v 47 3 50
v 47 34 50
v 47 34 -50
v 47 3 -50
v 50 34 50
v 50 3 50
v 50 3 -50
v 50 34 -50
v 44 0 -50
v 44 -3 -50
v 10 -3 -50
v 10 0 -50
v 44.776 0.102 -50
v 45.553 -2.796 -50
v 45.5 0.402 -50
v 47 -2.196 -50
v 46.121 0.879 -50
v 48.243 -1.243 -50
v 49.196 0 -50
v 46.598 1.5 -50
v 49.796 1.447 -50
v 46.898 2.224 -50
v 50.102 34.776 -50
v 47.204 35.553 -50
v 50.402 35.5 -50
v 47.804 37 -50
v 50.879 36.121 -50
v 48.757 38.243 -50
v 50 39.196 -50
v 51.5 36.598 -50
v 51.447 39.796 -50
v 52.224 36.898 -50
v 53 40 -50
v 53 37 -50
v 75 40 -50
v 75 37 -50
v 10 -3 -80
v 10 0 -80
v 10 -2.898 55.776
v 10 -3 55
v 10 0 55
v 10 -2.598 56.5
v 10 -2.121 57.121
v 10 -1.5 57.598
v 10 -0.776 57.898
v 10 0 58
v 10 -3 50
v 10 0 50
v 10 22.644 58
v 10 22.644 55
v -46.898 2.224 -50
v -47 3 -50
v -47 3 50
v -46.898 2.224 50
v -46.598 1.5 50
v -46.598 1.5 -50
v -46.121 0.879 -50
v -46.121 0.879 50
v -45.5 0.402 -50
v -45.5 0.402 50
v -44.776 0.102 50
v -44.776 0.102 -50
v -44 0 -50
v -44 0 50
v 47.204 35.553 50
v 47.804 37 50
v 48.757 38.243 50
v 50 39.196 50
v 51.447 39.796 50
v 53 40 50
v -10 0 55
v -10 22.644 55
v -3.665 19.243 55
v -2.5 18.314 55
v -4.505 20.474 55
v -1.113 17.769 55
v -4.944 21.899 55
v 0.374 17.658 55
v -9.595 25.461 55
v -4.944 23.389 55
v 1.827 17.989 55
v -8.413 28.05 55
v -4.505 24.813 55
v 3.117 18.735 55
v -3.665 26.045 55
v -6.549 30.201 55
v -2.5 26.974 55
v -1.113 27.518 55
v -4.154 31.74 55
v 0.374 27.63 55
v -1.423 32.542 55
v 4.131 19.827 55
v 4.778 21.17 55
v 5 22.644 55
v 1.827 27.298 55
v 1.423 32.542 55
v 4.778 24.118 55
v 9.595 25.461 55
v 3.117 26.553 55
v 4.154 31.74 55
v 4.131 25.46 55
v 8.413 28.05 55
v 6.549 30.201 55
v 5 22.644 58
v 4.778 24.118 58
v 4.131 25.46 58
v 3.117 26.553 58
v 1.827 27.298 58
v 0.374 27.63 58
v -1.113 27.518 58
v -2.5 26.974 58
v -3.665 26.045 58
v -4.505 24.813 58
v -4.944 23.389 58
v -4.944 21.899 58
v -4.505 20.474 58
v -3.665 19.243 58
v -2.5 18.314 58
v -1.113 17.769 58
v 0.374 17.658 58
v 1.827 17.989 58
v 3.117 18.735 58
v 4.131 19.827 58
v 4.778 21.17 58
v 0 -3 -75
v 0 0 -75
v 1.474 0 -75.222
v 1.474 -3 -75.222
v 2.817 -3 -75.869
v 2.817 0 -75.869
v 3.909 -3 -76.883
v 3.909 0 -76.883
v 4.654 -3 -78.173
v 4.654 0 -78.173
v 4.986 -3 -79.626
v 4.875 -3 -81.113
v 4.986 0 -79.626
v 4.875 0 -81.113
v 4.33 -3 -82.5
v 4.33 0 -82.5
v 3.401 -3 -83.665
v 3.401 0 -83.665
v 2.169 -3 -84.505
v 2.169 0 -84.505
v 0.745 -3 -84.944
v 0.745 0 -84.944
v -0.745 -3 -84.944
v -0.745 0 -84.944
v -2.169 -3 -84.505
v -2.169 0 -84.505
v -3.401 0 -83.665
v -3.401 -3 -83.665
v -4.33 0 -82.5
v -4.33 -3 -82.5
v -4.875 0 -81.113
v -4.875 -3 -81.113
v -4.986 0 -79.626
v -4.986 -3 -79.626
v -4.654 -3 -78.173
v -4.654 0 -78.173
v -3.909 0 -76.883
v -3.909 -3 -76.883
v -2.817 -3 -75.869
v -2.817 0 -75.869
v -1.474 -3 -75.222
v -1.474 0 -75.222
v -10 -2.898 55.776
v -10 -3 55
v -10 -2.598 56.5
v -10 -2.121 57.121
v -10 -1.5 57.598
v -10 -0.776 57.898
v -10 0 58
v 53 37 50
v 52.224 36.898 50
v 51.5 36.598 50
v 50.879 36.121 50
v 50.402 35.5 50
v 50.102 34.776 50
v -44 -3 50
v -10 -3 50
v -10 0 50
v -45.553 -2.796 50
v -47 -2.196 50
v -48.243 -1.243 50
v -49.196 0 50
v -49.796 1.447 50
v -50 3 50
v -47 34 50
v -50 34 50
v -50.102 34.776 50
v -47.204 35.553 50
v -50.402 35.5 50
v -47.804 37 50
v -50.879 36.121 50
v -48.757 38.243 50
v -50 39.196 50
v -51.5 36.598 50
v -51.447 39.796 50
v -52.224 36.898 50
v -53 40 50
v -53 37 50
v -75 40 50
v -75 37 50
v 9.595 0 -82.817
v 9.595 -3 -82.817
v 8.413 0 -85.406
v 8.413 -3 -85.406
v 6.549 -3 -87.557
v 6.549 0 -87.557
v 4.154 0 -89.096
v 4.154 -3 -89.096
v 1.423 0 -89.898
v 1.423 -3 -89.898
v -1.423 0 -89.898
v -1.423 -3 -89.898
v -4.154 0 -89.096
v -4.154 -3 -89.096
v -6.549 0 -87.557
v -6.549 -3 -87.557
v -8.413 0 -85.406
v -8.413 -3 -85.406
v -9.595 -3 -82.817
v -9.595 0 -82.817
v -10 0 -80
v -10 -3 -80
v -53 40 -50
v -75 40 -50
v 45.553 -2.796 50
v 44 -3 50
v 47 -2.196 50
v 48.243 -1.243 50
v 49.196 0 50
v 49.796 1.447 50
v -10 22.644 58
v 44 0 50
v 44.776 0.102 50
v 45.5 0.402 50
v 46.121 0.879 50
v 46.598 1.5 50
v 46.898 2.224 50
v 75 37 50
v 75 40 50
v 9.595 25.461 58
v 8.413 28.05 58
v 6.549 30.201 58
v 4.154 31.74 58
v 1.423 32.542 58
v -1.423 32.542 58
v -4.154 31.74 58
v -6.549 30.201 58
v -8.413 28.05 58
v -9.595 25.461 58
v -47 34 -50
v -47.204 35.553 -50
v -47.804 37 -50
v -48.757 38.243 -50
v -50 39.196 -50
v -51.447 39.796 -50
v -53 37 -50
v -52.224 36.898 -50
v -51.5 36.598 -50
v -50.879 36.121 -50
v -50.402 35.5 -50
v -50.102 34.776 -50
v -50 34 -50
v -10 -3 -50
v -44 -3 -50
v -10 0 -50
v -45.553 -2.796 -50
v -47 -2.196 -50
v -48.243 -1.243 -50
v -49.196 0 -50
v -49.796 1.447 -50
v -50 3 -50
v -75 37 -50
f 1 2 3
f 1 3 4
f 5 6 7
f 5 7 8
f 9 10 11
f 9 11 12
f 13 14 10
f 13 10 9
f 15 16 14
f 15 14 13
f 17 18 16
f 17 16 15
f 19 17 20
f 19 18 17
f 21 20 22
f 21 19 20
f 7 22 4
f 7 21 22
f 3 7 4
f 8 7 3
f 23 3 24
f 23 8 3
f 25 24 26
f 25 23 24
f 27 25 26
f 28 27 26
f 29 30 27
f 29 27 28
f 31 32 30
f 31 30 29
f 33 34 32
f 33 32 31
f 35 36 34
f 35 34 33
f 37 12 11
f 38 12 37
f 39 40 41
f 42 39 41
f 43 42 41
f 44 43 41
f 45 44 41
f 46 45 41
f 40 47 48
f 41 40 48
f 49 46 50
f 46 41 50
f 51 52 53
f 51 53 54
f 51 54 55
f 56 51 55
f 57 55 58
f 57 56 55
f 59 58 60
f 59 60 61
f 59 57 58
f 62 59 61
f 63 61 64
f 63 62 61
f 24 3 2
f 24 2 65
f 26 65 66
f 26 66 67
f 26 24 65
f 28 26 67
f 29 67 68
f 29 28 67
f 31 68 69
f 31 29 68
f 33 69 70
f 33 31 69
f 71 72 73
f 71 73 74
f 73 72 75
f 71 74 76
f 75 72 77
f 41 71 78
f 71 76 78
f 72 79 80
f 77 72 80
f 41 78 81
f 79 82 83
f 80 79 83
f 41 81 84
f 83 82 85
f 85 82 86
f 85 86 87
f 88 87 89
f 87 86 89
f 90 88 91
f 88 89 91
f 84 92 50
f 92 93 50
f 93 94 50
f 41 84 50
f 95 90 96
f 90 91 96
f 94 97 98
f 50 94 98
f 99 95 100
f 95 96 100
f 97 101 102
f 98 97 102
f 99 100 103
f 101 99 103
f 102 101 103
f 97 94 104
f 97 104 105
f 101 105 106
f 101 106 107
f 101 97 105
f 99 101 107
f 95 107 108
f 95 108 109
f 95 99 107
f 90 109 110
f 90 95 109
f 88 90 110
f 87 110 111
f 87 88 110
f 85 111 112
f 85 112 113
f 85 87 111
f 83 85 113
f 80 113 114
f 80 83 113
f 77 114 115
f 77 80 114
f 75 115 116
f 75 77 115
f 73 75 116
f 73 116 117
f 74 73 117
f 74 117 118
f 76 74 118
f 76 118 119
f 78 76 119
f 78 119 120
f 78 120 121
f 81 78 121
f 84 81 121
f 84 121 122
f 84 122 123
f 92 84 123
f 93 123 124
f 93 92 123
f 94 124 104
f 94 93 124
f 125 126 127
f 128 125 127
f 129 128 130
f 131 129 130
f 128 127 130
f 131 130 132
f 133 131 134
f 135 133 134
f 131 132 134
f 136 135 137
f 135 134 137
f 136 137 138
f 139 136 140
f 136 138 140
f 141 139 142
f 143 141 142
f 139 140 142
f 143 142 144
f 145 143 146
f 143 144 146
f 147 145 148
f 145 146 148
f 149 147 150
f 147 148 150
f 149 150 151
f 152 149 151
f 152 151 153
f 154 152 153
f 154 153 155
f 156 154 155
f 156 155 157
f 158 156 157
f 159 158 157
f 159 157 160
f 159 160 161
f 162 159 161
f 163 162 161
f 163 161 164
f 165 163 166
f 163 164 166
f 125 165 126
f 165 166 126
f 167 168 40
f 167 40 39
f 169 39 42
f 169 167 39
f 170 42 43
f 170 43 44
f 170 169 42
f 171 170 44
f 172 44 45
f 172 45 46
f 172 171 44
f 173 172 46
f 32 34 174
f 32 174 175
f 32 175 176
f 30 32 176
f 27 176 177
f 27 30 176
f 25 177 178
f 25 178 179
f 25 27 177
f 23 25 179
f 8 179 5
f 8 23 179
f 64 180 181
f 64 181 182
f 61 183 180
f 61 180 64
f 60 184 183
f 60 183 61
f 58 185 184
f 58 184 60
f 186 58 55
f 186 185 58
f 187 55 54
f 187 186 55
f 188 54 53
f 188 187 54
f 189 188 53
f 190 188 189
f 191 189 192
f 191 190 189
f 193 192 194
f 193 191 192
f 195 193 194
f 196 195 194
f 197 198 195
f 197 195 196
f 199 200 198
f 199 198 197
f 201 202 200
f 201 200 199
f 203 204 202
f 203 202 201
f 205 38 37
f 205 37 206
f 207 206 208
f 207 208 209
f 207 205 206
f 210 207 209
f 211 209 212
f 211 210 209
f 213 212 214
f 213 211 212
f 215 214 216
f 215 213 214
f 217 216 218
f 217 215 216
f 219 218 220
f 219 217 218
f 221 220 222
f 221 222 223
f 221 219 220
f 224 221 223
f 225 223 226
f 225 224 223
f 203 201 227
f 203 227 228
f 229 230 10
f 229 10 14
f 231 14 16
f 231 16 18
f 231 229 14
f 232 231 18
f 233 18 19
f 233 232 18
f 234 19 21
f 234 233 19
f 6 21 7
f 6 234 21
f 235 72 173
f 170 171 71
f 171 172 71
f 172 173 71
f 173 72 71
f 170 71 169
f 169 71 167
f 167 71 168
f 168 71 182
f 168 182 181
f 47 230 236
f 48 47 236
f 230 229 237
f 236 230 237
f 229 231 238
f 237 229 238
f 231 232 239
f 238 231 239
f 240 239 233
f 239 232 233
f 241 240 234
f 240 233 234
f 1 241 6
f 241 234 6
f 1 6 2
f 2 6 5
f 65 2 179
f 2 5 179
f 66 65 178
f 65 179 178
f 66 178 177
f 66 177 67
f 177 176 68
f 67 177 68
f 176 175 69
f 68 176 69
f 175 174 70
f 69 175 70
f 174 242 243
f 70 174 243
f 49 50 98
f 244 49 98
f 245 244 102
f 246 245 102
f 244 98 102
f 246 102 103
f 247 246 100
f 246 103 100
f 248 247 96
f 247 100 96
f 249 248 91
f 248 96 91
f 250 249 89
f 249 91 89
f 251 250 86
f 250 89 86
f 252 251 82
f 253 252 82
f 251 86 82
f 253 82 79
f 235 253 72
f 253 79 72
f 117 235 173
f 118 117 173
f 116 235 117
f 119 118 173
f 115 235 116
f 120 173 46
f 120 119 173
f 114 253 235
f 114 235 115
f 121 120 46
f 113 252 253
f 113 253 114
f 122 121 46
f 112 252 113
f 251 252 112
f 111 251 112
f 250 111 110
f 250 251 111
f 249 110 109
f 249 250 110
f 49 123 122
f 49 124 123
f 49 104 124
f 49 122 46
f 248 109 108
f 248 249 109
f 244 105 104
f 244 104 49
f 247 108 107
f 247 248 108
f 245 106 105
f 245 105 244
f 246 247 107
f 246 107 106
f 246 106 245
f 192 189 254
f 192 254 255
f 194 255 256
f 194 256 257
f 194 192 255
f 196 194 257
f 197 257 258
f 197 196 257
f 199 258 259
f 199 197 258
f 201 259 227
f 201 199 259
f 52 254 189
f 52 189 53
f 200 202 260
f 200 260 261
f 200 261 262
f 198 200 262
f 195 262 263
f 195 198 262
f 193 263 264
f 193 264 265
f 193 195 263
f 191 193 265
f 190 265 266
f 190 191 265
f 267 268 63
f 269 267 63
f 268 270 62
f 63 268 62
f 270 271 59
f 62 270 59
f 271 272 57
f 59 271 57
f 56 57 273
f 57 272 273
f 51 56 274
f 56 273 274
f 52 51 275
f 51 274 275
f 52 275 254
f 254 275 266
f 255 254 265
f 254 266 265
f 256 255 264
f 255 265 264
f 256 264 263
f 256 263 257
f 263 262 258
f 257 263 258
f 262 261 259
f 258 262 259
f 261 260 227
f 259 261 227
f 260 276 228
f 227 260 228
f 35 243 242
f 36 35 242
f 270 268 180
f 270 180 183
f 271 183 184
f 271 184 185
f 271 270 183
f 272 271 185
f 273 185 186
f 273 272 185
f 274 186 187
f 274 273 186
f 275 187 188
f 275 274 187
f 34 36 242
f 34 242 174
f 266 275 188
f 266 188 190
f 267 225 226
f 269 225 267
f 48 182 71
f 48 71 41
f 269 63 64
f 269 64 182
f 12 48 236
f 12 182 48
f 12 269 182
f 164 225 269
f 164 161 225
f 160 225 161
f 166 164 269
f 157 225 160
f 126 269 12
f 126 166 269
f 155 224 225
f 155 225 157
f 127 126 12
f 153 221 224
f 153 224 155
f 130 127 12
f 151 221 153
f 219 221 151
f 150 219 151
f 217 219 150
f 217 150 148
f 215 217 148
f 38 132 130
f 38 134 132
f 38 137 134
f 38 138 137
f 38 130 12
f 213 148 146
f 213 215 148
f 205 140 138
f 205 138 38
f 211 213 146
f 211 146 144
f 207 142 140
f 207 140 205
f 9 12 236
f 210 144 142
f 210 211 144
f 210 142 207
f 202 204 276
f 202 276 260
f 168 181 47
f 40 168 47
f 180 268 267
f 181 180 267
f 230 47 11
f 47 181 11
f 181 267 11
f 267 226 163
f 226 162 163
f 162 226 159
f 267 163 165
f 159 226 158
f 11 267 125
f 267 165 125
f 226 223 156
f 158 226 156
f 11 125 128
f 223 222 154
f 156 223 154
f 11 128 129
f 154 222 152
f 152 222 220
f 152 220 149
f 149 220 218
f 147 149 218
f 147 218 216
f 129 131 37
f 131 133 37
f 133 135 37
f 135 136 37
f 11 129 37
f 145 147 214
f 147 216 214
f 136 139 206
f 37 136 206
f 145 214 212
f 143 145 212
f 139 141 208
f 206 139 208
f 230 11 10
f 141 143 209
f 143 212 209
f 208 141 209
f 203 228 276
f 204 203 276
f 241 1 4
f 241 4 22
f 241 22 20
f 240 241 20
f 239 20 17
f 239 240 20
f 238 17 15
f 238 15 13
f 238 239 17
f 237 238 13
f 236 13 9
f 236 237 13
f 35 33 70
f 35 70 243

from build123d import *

# Parameters (mm, degrees)
SKETCH1_R                      = 5
BASE_FLANGE1_DEPTH             = 3
EDGE_FLANGE1_STRIP_W           = 18
EDGE_FLANGE1_STRIP_H           = 3
EDGE_FLANGE1_STRIP_CUT_DEPTH   = 100
EDGE_FLANGE1_STRIP_2_W         = 18
EDGE_FLANGE1_STRIP_2_H         = 3
EDGE_FLANGE1_STRIP_CUT_2_DEPTH = 100
EDGE_FLANGE1_DEPTH             = 100
EDGE_FLANGE1_BEND_DEPTH        = 100
EDGE_FLANGE2_STRIP_W           = 18
EDGE_FLANGE2_STRIP_H           = 3
EDGE_FLANGE2_STRIP_CUT_DEPTH   = 100
EDGE_FLANGE2_STRIP_2_W         = 18
EDGE_FLANGE2_STRIP_2_H         = 3
EDGE_FLANGE2_STRIP_CUT_2_DEPTH = 100
EDGE_FLANGE2_DEPTH             = 100
EDGE_FLANGE2_BEND_DEPTH        = 100
SKETCHED_START                 = 58
SKETCHED_BEND1_OUTLINE_W       = 20
SKETCHED_BEND1_OUTLINE_H       = 3
SKETCHED_BEND1_DEPTH           = 33
SKETCHED_START_2               = 55
SKETCHED_BEND1_2_OUTLINE_R     = 5
SKETCHED_BEND1_2_DEPTH         = 3
SKETCHED_START_3               = -11
SKETCHED_BEND1_3_DEPTH         = 22


with BuildPart() as part:
    # Base-Flange1: sheet metal written as solids
    # Sketch1 → Base-Flange1 (new body)
    with BuildSketch(Plane(origin=(0, 0, 0), x_dir=(1, 0, 0), z_dir=(0, 1, 0))):
        with BuildLine():
            Line((10, 50), (10, 80))
            ThreePointArc((10, 80), (0, 90), (-10, 80))
            Line((-10, 80), (-10, 50))
            Line((-10, 50), (-50, 50))
            Line((-50, 50), (-50, -50))
            Line((-50, -50), (-10, -50))
            Line((-10, -50), (-10, -80))
            ThreePointArc((-10, -80), (0, -90), (10, -80))
            Line((10, -80), (10, -50))
            Line((10, -50), (50, -50))
            Line((50, -50), (50, 50))
            Line((50, 50), (10, 50))
        make_face()
        with Locations(Location((0, 80, 0), (0, 0, 270))):
            Circle(SKETCH1_R, mode=Mode.SUBTRACT)
        with Locations(Location((0, -80, 0), (0, 0, 90))):
            Circle(SKETCH1_R, mode=Mode.SUBTRACT)
    extrude(amount=-BASE_FLANGE1_DEPTH)

    # Edge-Flange1: sheet metal written as solids
    # Edge-Flange1 strip (on a plane across the edge) → Edge-Flange1 strip cut (cut)
    with BuildSketch(Plane(origin=(50, 0, 50), x_dir=(-1, 0, 0), z_dir=(0, 0, -1))):
        with Locations((-3, -1.5)):
            Rectangle(EDGE_FLANGE1_STRIP_W, EDGE_FLANGE1_STRIP_H)
    extrude(amount=EDGE_FLANGE1_STRIP_CUT_DEPTH, mode=Mode.SUBTRACT)

    # Edge-Flange1 strip 2 (on a plane across the edge) → Edge-Flange1 strip cut 2 (cut)
    with BuildSketch(Plane(origin=(-50, 0, -50), x_dir=(1, 0, 0), z_dir=(0, 0, 1))):
        with Locations((-3, -1.5)):
            Rectangle(EDGE_FLANGE1_STRIP_2_W, EDGE_FLANGE1_STRIP_2_H)
    extrude(amount=EDGE_FLANGE1_STRIP_CUT_2_DEPTH, mode=Mode.SUBTRACT)

    # Edge-Flange1 section (on a plane across the edge) → Edge-Flange1 (add)
    with BuildSketch(Plane(origin=(50, 0, 50), x_dir=(-1, 0, 0), z_dir=(0, 0, -1))):
        with BuildLine():
            Line((0, 3), (0, 37))
            Line((0, 37), (3, 37))
            Line((3, 37), (3, 3))
            ThreePointArc((3, 3), (3.878679656, 0.878679656), (6, 0))
            Line((6, 0), (6, -3))
            ThreePointArc((6, -3), (1.757359313, -1.242640687), (0, 3))
        make_face()
    extrude(amount=EDGE_FLANGE1_DEPTH)

    # Edge-Flange1 section 2 (on a plane across the edge) → Edge-Flange1 bend (add)
    with BuildSketch(Plane(origin=(-50, 0, -50), x_dir=(1, 0, 0), z_dir=(0, 0, 1))):
        with BuildLine():
            Line((0, 3), (0, 37))
            Line((0, 37), (3, 37))
            Line((3, 37), (3, 3))
            ThreePointArc((3, 3), (3.878679656, 0.878679656), (6, 0))
            Line((6, 0), (6, -3))
            ThreePointArc((6, -3), (1.757359313, -1.242640687), (0, 3))
        make_face()
    extrude(amount=EDGE_FLANGE1_BEND_DEPTH)

    # Edge-Flange2: sheet metal written as solids
    # Edge-Flange2 strip (on a plane across the edge) → Edge-Flange2 strip cut (cut)
    with BuildSketch(Plane(origin=(-50, 37, 50), x_dir=(0, -1, 0), z_dir=(0, 0, -1))):
        with Locations((-6, -1.5)):
            Rectangle(EDGE_FLANGE2_STRIP_W, EDGE_FLANGE2_STRIP_H)
    extrude(amount=EDGE_FLANGE2_STRIP_CUT_DEPTH, mode=Mode.SUBTRACT)

    # Edge-Flange2 strip 2 (on a plane across the edge) → Edge-Flange2 strip cut 2 (cut)
    with BuildSketch(Plane(origin=(50, 37, -50), x_dir=(0, -1, 0), z_dir=(0, 0, 1))):
        with Locations((-6, -1.5)):
            Rectangle(EDGE_FLANGE2_STRIP_2_W, EDGE_FLANGE2_STRIP_2_H)
    extrude(amount=EDGE_FLANGE2_STRIP_CUT_2_DEPTH, mode=Mode.SUBTRACT)

    # Edge-Flange2 section (on a plane across the edge) → Edge-Flange2 (add)
    with BuildSketch(Plane(origin=(-50, 37, 50), x_dir=(0, -1, 0), z_dir=(0, 0, -1))):
        with BuildLine():
            Line((-3, 3), (-3, 25))
            Line((-3, 25), (0, 25))
            Line((0, 25), (0, 3))
            ThreePointArc((0, 3), (0.878679656, 0.878679656), (3, 0))
            Line((3, 0), (3, -3))
            ThreePointArc((3, -3), (-1.242640687, -1.242640687), (-3, 3))
        make_face()
    extrude(amount=EDGE_FLANGE2_DEPTH)

    # Edge-Flange2 section 2 (on a plane across the edge) → Edge-Flange2 bend (add)
    with BuildSketch(Plane(origin=(50, 37, -50), x_dir=(0, -1, 0), z_dir=(0, 0, 1))):
        with BuildLine():
            Line((-3, 3), (-3, 25))
            Line((-3, 25), (0, 25))
            Line((0, 25), (0, 3))
            ThreePointArc((0, 3), (0.878679656, 0.878679656), (3, 0))
            Line((3, 0), (3, -3))
            ThreePointArc((3, -3), (-1.242640687, -1.242640687), (-3, 3))
        make_face()
    extrude(amount=EDGE_FLANGE2_BEND_DEPTH)

    # Sketched Bend1: read off the stored shape, not the designer's step
    # Sketched Bend1 outline → Sketched Bend1 (cut)
    with BuildSketch(Plane.XY.offset(SKETCHED_START)):
        with Locations((0, -1.5)):
            Rectangle(SKETCHED_BEND1_OUTLINE_W, SKETCHED_BEND1_OUTLINE_H)
    extrude(amount=SKETCHED_BEND1_DEPTH, mode=Mode.SUBTRACT)

    # Sketched Bend1 2 outline → Sketched Bend1 2 (add)
    with BuildSketch(Plane.XY.offset(SKETCHED_START_2)):
        with BuildLine():
            ThreePointArc((10, 22.64380551), (0, 32.64380551), (-10, 22.64380551))
            Line((-10, 22.64380551), (-10, 0))
            Line((-10, 0), (10, 0))
            Line((10, 0), (10, 22.64380551))
        make_face()
        with Locations((0, 22.64380551)):
            Circle(SKETCHED_BEND1_2_OUTLINE_R, mode=Mode.SUBTRACT)
    extrude(amount=SKETCHED_BEND1_2_DEPTH)

    # Sketched Bend1 3 outline → Sketched Bend1 3 (cut)
    with BuildSketch(Plane.YZ.offset(SKETCHED_START_3)):
        with BuildLine():
            ThreePointArc((-3, 55), (-2.121320344, 57.121320344), (0, 58))
            Line((0, 58), (-3, 58))
            Line((-3, 58), (-3, 55))
        make_face()
    extrude(amount=SKETCHED_BEND1_3_DEPTH, mode=Mode.SUBTRACT)


solid = part.part
